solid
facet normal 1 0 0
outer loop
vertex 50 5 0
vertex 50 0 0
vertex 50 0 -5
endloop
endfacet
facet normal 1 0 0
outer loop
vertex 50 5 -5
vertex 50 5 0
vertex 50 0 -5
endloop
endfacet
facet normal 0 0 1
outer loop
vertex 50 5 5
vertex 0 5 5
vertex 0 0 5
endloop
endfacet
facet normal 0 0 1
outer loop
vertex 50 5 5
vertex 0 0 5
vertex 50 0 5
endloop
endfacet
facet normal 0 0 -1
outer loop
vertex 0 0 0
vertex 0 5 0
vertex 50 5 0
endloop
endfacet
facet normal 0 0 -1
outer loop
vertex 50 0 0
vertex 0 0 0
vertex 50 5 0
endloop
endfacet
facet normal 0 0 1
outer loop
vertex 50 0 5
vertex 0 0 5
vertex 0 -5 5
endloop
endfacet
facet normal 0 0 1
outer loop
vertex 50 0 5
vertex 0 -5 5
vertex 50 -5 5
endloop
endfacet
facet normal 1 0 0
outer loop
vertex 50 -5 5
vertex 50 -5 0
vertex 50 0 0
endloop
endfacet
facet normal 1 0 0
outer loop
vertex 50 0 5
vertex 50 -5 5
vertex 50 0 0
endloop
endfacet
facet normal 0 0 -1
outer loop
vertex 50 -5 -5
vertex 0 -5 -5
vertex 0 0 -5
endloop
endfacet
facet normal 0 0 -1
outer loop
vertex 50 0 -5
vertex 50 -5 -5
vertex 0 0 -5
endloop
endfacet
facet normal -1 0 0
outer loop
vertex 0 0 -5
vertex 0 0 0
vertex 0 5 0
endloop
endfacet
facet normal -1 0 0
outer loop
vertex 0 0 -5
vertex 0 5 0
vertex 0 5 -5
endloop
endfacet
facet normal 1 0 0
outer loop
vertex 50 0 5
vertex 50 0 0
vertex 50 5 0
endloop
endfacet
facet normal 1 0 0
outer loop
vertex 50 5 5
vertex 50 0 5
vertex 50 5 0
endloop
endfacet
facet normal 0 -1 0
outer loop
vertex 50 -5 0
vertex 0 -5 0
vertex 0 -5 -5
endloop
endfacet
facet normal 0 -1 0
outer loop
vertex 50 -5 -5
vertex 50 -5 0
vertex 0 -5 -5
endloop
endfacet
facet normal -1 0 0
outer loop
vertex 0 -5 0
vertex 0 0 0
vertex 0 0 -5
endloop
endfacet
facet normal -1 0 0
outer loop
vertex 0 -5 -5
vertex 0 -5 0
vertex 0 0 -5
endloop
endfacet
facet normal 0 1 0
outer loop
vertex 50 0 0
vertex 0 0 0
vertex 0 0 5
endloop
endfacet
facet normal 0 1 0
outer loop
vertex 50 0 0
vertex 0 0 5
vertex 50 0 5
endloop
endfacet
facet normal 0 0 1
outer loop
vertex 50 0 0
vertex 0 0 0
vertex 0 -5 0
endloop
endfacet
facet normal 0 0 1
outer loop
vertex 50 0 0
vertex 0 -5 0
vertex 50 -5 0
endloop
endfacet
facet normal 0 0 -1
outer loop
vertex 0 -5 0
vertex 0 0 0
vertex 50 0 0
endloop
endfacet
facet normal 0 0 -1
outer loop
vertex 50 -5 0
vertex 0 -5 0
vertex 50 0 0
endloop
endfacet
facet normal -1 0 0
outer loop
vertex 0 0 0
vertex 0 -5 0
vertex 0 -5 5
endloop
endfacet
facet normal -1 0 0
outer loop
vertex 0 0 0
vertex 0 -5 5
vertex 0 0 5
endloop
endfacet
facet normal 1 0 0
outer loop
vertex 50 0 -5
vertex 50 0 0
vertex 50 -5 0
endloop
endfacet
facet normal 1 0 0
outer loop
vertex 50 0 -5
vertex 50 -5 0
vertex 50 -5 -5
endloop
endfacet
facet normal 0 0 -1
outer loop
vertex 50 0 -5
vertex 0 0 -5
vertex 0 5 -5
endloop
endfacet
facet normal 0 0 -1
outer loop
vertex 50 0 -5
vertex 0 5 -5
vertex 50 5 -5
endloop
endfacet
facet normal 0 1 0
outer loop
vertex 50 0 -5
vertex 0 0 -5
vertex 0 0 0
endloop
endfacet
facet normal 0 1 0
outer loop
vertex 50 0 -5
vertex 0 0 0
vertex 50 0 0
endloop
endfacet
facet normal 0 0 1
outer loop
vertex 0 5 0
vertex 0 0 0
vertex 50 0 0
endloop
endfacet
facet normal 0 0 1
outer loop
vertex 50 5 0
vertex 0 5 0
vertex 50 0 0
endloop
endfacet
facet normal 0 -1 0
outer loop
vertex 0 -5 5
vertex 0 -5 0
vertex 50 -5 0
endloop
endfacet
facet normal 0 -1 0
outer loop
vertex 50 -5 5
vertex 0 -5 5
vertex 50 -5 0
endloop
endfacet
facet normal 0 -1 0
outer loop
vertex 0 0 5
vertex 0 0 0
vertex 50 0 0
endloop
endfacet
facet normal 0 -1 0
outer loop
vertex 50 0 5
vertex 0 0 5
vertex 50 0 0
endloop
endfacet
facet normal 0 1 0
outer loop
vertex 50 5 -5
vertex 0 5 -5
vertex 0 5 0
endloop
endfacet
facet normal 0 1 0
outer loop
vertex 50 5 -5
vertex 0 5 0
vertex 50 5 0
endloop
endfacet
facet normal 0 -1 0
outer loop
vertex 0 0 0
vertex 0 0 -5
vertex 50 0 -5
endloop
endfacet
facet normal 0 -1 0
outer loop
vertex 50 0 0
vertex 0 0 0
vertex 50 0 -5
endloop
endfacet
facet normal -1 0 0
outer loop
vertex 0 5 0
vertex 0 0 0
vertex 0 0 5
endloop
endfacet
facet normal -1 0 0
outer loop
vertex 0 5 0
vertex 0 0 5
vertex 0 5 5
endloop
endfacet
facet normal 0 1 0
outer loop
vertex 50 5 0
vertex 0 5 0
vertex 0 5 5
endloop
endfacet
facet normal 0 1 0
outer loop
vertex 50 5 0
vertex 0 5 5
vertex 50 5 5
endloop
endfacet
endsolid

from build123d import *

# Parameters (mm, degrees)
SKETCH_1_W                 = 10
SKETCH_1_H                 = 10
EXTRUDE_1_DEPTH            = 50
SPLIT_START                = -5
SPLIT_BODIES_1_OUTLINE_W   = 50
SPLIT_BODIES_1_OUTLINE_H   = 5
SPLIT_BODIES_1_DEPTH       = 10
SPLIT_BODIES_1_2_OUTLINE_W = 50
SPLIT_BODIES_1_2_OUTLINE_H = 5
SPLIT_BODIES_1_2_DEPTH     = 5
SPLIT_BODIES_1_3_OUTLINE_W = 50
SPLIT_BODIES_1_3_OUTLINE_H = 5
SPLIT_BODIES_1_3_DEPTH     = 5
SPLIT_BODIES_1_4_OUTLINE_W = 50
SPLIT_BODIES_1_4_OUTLINE_H = 5
SPLIT_BODIES_1_4_DEPTH     = 5
SPLIT_BODIES_1_5_OUTLINE_W = 50
SPLIT_BODIES_1_5_OUTLINE_H = 5
SPLIT_BODIES_1_5_DEPTH     = 5


# Read off the part's stored shape, not the designer's step: Разделить1
with BuildPart() as part:
    # Эскиз1 → Бобышка-Вытянуть1 (new body)
    with BuildSketch(Plane(origin=(0, 0, 0), x_dir=(0, 0, -1), z_dir=(1, 0, 0))):
        Rectangle(SKETCH_1_W, SKETCH_1_H)
    extrude(amount=EXTRUDE_1_DEPTH)

    # Split Bodies 1 outline → Split Bodies 1 (cut)
    with BuildSketch(Plane.XY.offset(SPLIT_START)):
        with Locations((25, 2.5)):
            Rectangle(SPLIT_BODIES_1_OUTLINE_W, SPLIT_BODIES_1_OUTLINE_H)
    extrude(amount=SPLIT_BODIES_1_DEPTH, mode=Mode.SUBTRACT)

    # Split Bodies 1 2 outline → Split Bodies 1 2 (cut)
    with BuildSketch(Plane.XY):
        with Locations((25, -2.5)):
            Rectangle(SPLIT_BODIES_1_2_OUTLINE_W, SPLIT_BODIES_1_2_OUTLINE_H)
    extrude(amount=SPLIT_BODIES_1_2_DEPTH, mode=Mode.SUBTRACT)


with BuildPart() as body_2:
    # Split Bodies 1 3 outline → Split Bodies 1 3 (new body)
    with BuildSketch(Plane.XY):
        with Locations((25, 2.5)):
            Rectangle(SPLIT_BODIES_1_3_OUTLINE_W, SPLIT_BODIES_1_3_OUTLINE_H)
    extrude(amount=SPLIT_BODIES_1_3_DEPTH)


with BuildPart() as body_3:
    # Split Bodies 1 4 outline → Split Bodies 1 4 (new body)
    with BuildSketch(Plane.XY):
        with Locations((25, -2.5)):
            Rectangle(SPLIT_BODIES_1_4_OUTLINE_W, SPLIT_BODIES_1_4_OUTLINE_H)
    extrude(amount=SPLIT_BODIES_1_4_DEPTH)


with BuildPart() as body_4:
    # Split Bodies 1 5 outline → Split Bodies 1 5 (new body)
    with BuildSketch(Plane(origin=(0, 0, 0), x_dir=(1, 0, 0), z_dir=(0, 1, 0))):
        with Locations((25, 2.5)):
            Rectangle(SPLIT_BODIES_1_5_OUTLINE_W, SPLIT_BODIES_1_5_OUTLINE_H)
    extrude(amount=SPLIT_BODIES_1_5_DEPTH)


solid = Compound([part.part, body_2.part, body_3.part, body_4.part])
